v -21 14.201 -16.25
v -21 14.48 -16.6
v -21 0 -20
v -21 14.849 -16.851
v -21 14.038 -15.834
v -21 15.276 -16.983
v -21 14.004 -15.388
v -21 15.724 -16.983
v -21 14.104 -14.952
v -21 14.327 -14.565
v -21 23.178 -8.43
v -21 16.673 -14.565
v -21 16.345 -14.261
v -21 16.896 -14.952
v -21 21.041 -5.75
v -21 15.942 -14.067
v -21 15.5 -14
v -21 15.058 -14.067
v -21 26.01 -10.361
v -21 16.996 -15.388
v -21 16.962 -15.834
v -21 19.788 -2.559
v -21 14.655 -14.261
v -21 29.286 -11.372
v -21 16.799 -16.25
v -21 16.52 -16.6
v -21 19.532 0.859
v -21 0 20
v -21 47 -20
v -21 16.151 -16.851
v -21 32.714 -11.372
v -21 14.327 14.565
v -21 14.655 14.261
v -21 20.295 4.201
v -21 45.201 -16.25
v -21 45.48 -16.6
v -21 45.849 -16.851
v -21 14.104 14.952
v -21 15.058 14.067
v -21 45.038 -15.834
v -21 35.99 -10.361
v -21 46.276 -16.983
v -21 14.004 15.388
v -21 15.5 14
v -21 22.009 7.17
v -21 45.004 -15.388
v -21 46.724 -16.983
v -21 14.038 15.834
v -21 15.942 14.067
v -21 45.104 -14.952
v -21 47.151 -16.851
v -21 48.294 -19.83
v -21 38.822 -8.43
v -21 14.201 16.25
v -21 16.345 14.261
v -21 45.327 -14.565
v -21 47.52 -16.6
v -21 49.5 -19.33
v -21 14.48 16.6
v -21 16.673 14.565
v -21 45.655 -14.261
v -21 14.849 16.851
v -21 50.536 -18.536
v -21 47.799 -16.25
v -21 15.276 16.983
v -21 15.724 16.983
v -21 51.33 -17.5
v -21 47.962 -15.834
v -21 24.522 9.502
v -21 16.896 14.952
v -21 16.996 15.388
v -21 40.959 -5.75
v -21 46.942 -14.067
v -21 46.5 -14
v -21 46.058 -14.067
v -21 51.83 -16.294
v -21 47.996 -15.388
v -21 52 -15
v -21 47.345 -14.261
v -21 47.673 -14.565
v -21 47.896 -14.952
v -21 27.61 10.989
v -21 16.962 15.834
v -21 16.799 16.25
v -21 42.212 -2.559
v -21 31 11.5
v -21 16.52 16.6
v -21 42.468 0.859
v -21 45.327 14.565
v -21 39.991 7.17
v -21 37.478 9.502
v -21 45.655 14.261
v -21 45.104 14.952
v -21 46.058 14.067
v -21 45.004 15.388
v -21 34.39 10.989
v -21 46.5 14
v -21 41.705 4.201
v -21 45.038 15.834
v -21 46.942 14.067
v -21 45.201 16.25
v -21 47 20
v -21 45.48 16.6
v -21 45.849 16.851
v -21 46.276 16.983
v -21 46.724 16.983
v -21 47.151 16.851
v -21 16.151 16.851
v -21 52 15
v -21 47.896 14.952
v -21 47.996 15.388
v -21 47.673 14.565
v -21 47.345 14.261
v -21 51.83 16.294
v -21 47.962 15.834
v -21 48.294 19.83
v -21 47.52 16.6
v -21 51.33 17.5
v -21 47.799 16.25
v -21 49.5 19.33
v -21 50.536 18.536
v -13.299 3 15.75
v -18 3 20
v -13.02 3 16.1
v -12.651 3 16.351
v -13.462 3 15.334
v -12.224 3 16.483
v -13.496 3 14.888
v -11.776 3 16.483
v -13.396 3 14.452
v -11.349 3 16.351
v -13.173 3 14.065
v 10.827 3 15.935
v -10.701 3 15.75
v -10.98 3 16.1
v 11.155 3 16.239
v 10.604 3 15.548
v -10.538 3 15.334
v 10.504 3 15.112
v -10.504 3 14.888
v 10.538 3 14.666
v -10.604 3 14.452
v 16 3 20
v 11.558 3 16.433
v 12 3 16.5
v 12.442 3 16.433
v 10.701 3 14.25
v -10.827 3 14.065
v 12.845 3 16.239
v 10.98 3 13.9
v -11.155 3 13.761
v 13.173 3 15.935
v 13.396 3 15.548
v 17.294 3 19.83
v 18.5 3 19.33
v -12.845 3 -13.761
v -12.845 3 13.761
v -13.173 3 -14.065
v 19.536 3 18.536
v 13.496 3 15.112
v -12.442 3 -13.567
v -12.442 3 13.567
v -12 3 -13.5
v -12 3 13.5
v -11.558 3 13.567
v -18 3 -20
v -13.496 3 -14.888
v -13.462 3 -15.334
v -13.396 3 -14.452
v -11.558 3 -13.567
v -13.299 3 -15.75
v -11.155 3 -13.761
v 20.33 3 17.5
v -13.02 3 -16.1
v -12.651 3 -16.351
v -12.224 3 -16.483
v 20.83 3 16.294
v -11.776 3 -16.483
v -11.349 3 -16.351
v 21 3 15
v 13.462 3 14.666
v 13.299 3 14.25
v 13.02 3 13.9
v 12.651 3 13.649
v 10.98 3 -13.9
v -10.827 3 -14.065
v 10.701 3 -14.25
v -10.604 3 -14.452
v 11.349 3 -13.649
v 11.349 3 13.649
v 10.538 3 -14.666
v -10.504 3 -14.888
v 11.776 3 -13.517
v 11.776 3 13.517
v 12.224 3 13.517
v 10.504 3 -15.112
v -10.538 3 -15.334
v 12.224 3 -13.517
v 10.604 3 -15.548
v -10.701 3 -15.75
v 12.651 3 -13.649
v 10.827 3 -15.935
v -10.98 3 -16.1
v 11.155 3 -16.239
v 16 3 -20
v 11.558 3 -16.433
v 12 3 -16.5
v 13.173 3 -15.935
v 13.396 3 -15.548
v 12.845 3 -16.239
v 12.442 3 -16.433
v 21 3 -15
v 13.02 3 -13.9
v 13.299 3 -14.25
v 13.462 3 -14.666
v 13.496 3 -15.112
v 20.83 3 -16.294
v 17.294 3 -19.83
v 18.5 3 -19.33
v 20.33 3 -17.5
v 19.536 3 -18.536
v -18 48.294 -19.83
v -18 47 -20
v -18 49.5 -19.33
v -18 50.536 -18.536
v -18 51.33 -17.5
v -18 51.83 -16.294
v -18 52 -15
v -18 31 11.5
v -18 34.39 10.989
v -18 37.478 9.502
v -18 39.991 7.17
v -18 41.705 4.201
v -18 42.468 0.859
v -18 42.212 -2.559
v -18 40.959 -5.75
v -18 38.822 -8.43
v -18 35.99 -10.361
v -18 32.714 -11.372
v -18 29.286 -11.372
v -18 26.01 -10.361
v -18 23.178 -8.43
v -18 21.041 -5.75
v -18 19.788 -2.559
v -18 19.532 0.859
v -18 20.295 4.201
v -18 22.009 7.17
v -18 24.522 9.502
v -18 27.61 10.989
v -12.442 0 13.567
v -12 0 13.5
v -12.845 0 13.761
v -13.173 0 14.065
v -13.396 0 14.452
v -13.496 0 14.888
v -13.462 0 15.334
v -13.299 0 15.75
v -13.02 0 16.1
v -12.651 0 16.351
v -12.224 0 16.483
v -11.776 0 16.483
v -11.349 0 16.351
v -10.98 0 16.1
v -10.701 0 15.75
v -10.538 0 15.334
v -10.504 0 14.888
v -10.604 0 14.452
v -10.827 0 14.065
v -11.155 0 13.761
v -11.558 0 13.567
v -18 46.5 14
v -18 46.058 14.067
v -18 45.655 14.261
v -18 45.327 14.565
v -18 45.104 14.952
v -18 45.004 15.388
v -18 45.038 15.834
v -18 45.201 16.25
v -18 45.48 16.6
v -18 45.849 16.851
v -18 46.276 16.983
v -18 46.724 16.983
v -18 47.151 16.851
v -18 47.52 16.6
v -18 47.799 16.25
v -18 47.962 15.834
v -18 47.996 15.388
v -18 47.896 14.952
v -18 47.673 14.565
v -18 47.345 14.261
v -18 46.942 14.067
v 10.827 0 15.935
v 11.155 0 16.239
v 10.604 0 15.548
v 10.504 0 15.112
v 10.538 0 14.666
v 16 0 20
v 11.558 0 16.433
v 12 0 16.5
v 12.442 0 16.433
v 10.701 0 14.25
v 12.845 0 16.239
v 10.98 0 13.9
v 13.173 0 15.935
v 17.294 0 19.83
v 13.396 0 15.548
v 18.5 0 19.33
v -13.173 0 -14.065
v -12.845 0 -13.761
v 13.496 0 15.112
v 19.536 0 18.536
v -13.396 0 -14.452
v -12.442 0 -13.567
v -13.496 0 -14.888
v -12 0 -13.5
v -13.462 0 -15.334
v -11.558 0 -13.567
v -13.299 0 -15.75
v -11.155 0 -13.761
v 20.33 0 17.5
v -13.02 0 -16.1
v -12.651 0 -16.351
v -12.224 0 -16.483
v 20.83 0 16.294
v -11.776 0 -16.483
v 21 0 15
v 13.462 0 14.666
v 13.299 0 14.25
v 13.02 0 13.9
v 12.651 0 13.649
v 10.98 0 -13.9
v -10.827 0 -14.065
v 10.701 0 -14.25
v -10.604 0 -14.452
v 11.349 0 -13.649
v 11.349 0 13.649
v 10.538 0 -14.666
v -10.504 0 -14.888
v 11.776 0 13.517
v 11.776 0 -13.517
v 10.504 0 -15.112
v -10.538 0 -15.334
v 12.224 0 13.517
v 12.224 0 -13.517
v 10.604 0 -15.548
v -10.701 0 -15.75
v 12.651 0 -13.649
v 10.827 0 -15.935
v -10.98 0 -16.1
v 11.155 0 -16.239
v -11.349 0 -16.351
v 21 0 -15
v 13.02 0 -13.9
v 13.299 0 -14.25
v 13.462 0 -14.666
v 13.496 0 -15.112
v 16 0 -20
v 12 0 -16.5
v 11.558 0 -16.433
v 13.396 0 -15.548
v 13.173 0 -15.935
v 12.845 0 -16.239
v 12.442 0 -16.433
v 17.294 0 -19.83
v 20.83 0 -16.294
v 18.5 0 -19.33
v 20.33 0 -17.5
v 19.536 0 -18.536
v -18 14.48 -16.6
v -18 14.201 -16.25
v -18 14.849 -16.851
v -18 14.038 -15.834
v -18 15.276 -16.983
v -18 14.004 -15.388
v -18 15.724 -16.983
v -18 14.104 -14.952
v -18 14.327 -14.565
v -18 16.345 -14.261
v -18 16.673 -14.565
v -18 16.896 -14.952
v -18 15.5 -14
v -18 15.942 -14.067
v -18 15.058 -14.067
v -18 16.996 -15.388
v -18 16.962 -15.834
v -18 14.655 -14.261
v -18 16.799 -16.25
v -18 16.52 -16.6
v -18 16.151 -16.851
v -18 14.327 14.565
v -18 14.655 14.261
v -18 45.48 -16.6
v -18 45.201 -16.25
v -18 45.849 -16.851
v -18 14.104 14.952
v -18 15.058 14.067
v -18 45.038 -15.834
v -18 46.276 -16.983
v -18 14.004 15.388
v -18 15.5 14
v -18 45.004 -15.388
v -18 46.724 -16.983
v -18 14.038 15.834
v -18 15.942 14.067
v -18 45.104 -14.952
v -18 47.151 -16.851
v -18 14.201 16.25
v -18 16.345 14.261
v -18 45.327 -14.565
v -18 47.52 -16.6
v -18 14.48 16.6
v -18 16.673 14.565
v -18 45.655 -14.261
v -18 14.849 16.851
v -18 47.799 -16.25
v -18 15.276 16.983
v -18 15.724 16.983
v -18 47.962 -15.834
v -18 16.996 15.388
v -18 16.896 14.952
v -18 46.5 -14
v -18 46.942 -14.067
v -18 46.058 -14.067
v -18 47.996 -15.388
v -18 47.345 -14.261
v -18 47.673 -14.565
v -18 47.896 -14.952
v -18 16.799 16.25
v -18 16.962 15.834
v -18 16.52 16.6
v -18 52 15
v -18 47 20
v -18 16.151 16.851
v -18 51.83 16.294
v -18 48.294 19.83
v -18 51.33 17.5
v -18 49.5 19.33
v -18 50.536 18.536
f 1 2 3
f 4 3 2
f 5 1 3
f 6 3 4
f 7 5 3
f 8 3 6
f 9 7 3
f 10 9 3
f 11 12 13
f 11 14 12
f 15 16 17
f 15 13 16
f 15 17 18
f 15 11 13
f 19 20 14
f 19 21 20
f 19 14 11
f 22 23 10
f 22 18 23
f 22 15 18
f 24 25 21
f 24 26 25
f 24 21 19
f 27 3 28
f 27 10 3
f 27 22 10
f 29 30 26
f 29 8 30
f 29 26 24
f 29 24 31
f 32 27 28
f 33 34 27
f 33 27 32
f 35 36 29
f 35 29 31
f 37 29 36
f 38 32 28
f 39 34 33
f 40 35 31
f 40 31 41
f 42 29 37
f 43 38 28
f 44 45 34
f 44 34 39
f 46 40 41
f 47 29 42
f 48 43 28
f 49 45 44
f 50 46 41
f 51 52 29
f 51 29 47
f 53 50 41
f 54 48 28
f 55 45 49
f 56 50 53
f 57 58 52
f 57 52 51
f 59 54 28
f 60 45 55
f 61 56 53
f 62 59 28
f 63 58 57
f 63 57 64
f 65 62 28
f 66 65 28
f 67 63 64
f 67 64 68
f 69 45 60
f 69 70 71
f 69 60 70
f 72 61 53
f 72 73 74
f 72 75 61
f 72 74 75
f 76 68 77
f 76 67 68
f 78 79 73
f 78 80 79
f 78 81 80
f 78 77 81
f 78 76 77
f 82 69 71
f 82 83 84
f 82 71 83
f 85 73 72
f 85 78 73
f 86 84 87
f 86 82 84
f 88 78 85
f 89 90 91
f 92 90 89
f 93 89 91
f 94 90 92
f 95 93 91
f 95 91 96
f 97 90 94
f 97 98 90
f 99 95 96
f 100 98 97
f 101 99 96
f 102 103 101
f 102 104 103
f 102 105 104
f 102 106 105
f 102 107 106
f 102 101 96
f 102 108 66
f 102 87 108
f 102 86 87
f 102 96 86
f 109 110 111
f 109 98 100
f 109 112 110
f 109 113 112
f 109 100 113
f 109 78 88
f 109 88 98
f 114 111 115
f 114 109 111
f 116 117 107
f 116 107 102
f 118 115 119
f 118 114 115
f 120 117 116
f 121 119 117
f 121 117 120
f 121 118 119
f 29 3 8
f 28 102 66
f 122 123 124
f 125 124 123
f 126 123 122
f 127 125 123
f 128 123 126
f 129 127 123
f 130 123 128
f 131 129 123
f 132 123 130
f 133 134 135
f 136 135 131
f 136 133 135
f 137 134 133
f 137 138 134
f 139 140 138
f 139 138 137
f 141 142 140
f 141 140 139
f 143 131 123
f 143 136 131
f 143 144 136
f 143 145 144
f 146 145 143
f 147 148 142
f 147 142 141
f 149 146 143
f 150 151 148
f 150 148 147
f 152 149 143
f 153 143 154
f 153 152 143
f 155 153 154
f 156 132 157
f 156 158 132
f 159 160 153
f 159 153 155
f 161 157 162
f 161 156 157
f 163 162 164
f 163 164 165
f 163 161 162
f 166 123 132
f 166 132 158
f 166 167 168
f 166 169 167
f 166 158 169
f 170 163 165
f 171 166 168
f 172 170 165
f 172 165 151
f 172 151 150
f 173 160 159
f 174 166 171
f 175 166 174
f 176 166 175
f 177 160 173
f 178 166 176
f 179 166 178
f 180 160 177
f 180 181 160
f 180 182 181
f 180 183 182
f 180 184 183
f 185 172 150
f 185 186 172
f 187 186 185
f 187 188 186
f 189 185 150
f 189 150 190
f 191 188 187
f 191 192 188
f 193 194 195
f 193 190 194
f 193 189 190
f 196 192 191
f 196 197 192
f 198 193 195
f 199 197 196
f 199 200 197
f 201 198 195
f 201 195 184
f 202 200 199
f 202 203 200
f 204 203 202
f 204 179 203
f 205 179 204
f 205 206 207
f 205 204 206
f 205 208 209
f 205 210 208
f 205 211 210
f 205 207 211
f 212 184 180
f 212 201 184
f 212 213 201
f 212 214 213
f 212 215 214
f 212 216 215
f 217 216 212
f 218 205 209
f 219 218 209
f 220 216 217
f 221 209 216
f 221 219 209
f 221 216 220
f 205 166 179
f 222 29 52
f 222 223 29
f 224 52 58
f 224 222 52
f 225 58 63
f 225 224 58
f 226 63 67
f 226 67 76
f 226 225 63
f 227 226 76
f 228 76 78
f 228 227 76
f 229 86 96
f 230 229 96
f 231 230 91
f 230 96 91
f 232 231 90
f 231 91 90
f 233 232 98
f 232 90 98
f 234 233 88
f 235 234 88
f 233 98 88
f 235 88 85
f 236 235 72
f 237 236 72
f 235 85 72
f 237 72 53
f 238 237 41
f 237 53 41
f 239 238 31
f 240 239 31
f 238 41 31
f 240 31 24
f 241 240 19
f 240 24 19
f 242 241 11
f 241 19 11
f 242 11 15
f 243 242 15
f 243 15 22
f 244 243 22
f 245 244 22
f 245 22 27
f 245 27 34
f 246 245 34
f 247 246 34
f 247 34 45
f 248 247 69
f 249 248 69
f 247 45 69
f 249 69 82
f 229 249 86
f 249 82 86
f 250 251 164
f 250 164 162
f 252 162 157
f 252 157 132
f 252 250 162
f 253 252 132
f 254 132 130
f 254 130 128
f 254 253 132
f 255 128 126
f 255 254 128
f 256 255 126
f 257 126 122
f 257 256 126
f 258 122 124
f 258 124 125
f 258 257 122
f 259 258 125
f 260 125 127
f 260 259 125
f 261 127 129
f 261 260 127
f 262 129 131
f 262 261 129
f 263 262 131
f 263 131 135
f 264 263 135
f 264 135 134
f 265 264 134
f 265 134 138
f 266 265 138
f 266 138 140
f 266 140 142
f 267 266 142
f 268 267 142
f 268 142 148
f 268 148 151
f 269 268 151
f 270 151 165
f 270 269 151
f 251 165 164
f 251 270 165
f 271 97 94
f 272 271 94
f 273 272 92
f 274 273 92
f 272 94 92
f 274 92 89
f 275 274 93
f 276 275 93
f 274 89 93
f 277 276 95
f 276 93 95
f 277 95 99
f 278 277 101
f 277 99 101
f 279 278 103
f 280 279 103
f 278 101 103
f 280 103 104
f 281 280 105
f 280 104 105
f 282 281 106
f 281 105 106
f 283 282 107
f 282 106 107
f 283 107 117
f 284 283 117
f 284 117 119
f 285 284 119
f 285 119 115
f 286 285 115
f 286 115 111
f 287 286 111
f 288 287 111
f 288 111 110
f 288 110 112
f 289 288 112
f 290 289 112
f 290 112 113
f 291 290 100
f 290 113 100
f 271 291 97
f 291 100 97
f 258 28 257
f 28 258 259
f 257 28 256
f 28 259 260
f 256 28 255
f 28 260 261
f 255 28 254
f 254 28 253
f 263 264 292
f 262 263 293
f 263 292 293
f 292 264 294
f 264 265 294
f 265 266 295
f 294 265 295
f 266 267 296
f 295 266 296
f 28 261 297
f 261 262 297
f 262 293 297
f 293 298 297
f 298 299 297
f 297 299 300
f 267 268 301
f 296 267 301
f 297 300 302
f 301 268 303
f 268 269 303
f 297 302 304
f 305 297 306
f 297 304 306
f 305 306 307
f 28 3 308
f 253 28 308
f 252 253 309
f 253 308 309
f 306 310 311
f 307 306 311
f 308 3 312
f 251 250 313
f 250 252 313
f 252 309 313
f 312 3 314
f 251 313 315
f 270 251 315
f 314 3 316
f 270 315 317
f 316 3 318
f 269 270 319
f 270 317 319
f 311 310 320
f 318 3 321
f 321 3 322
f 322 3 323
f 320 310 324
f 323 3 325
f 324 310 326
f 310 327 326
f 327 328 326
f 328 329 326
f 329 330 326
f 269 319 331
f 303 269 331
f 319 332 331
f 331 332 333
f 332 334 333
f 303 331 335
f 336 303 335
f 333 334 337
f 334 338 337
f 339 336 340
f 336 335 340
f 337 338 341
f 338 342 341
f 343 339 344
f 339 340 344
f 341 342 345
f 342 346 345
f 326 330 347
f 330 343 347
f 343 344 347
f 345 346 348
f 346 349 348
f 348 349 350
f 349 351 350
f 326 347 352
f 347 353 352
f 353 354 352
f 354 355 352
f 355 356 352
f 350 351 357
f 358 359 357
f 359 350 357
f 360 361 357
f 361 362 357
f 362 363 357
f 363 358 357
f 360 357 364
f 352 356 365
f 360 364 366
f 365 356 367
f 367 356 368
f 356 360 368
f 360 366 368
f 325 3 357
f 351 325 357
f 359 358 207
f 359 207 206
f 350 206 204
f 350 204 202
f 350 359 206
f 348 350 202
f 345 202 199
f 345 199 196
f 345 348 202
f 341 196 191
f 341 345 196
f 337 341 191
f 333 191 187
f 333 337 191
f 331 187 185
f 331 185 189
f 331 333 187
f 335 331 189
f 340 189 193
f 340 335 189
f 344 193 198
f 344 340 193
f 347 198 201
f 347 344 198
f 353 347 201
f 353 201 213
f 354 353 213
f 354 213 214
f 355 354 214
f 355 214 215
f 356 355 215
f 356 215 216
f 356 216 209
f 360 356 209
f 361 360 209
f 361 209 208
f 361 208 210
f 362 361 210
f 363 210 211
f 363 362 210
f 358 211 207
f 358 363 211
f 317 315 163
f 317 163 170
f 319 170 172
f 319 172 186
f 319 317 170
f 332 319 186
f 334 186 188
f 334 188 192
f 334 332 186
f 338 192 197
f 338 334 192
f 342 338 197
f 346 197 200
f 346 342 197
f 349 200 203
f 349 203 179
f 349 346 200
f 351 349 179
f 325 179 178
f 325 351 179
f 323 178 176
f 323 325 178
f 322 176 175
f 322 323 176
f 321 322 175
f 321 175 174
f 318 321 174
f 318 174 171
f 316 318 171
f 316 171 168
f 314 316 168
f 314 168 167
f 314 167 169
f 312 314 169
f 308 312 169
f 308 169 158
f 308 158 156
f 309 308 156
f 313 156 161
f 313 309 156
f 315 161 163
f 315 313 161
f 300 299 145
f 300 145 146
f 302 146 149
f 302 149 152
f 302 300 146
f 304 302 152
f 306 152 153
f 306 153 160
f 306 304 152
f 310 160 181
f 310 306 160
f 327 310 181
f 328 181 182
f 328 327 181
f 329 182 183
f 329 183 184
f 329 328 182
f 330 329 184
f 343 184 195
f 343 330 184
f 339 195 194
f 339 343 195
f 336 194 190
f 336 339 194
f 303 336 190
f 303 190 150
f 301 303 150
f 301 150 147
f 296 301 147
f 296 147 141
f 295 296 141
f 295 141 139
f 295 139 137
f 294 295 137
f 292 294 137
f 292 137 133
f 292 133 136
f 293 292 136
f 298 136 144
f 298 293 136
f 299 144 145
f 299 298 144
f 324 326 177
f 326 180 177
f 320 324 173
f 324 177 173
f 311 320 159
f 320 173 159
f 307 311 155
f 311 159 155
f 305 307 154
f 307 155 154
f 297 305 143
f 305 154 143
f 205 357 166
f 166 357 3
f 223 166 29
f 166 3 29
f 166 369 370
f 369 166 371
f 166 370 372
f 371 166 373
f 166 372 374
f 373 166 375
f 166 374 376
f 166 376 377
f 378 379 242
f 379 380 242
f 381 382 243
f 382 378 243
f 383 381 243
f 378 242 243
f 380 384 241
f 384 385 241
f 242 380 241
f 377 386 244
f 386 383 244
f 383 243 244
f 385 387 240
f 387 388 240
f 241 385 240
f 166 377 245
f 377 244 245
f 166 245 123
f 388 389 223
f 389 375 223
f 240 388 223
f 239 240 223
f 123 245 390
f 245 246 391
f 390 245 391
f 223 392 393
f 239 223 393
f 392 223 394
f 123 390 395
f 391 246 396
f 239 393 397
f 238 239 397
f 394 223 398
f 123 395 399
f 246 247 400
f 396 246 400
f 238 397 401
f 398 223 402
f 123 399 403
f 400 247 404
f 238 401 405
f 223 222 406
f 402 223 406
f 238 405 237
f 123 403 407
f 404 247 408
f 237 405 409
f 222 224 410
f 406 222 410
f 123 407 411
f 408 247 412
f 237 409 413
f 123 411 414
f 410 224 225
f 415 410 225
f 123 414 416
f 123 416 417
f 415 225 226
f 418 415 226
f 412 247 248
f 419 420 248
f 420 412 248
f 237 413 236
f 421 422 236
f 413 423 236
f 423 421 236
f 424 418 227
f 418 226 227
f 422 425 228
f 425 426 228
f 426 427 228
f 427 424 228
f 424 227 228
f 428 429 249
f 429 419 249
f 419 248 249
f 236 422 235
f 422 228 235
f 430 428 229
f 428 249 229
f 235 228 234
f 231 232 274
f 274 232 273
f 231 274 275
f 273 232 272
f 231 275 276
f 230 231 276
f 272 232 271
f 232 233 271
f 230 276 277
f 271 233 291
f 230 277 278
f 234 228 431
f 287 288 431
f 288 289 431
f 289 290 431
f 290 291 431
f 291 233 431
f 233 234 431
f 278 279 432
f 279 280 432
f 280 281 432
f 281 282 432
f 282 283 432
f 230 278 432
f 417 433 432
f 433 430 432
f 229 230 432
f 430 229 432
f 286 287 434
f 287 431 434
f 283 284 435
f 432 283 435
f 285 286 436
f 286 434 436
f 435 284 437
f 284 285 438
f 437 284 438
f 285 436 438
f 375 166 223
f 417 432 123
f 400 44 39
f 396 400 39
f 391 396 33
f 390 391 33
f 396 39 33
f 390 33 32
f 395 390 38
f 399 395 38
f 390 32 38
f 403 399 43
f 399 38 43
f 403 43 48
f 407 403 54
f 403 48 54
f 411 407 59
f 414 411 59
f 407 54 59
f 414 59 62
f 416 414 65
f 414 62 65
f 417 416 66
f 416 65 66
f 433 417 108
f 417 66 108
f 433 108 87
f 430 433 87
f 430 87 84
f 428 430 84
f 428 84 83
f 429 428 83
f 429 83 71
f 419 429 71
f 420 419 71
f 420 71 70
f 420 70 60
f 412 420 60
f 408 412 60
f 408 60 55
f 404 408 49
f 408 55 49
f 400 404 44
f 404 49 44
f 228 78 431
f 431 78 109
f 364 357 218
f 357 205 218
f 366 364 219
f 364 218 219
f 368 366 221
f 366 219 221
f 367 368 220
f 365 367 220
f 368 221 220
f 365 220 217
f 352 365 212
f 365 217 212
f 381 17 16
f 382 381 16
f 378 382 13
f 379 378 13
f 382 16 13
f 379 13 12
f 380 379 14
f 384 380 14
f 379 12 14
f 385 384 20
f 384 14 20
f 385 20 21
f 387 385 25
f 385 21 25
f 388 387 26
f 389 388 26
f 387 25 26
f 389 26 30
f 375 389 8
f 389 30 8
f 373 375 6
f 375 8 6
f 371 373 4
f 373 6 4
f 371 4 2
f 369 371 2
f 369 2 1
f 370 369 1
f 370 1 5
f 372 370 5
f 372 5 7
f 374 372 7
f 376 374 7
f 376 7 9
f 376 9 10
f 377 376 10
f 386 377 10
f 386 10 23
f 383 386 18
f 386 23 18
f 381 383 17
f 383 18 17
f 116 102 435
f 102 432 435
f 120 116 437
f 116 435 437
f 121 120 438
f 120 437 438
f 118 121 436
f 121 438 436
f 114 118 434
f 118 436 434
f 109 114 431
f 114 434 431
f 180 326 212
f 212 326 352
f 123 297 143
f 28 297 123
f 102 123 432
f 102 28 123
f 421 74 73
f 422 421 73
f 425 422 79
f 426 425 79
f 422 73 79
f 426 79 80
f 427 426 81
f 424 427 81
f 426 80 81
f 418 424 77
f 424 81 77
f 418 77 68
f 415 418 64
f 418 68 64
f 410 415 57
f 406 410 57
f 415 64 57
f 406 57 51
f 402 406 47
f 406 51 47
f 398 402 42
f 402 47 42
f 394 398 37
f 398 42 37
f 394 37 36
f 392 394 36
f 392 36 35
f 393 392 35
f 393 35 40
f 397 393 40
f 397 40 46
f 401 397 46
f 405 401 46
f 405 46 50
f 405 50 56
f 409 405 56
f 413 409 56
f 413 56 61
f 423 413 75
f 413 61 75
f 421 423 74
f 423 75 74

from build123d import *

# Parameters (mm, degrees)
SKETCH_1_W      = 42
SKETCH_1_H      = 40
SKETCH_1_R      = 1.5
EXTRUDE_1_DEPTH = 3
SKETCH_3_W      = 40
SKETCH_3_H      = 49
SKETCH_3_R      = 11.5
SKETCH_3_R_2    = 1.5
EXTRUDE_2_DEPTH = 3
FILLET_1_R      = 5
FILLET_2_R      = 5


with BuildPart() as part:
    # 草图1 → 凸台-拉伸1 (new body)
    with BuildSketch(Plane(origin=(0, 0, 0), x_dir=(1, 0, 0), z_dir=(0, 1, 0))):
        Rectangle(SKETCH_1_W, SKETCH_1_H)
        with Locations(Location((-12, 15, 0), (0, 0, 270))):
            Circle(SKETCH_1_R, mode=Mode.SUBTRACT)
        with Locations(Location((-12, -15, 0), (0, 0, 90))):
            Circle(SKETCH_1_R, mode=Mode.SUBTRACT)
        with Locations(Location((12, -15, 0), (0, 0, 270))):
            Circle(SKETCH_1_R, mode=Mode.SUBTRACT)
        with Locations(Location((12, 15, 0), (0, 0, 90))):
            Circle(SKETCH_1_R, mode=Mode.SUBTRACT)
    extrude(amount=EXTRUDE_1_DEPTH)

    # 草图3 → 凸台-拉伸2 (add)
    with BuildSketch(Plane.ZY.offset(21)):
        with Locations((0, 27.5)):
            Rectangle(SKETCH_3_W, SKETCH_3_H)
        with Locations((0, 31)):
            Circle(SKETCH_3_R, mode=Mode.SUBTRACT)
        with Locations((-15.5, 46.5)):
            Circle(SKETCH_3_R_2, mode=Mode.SUBTRACT)
        with Locations((-15.5, 15.5)):
            Circle(SKETCH_3_R_2, mode=Mode.SUBTRACT)
        with Locations(Location((15.5, 15.5, 0), (0, 0, 180))):
            Circle(SKETCH_3_R_2, mode=Mode.SUBTRACT)
        with Locations(Location((15.5, 46.5, 0), (0, 0, 180))):
            Circle(SKETCH_3_R_2, mode=Mode.SUBTRACT)
    extrude(amount=-EXTRUDE_2_DEPTH)

    # 圆角1
    fillet_1_edges = [part.edges().sort_by_distance(p)[0] for p in [
        (-19.5, 52, -20),
        (-19.5, 52, 20),
    ]]
    fillet(fillet_1_edges, radius=FILLET_1_R)

    # 圆角2
    fillet_2_edges = [part.edges().sort_by_distance(p)[0] for p in [
        (21, 1.5, 20),
        (21, 1.5, -20),
    ]]
    fillet(fillet_2_edges, radius=FILLET_2_R)


solid = part.part
